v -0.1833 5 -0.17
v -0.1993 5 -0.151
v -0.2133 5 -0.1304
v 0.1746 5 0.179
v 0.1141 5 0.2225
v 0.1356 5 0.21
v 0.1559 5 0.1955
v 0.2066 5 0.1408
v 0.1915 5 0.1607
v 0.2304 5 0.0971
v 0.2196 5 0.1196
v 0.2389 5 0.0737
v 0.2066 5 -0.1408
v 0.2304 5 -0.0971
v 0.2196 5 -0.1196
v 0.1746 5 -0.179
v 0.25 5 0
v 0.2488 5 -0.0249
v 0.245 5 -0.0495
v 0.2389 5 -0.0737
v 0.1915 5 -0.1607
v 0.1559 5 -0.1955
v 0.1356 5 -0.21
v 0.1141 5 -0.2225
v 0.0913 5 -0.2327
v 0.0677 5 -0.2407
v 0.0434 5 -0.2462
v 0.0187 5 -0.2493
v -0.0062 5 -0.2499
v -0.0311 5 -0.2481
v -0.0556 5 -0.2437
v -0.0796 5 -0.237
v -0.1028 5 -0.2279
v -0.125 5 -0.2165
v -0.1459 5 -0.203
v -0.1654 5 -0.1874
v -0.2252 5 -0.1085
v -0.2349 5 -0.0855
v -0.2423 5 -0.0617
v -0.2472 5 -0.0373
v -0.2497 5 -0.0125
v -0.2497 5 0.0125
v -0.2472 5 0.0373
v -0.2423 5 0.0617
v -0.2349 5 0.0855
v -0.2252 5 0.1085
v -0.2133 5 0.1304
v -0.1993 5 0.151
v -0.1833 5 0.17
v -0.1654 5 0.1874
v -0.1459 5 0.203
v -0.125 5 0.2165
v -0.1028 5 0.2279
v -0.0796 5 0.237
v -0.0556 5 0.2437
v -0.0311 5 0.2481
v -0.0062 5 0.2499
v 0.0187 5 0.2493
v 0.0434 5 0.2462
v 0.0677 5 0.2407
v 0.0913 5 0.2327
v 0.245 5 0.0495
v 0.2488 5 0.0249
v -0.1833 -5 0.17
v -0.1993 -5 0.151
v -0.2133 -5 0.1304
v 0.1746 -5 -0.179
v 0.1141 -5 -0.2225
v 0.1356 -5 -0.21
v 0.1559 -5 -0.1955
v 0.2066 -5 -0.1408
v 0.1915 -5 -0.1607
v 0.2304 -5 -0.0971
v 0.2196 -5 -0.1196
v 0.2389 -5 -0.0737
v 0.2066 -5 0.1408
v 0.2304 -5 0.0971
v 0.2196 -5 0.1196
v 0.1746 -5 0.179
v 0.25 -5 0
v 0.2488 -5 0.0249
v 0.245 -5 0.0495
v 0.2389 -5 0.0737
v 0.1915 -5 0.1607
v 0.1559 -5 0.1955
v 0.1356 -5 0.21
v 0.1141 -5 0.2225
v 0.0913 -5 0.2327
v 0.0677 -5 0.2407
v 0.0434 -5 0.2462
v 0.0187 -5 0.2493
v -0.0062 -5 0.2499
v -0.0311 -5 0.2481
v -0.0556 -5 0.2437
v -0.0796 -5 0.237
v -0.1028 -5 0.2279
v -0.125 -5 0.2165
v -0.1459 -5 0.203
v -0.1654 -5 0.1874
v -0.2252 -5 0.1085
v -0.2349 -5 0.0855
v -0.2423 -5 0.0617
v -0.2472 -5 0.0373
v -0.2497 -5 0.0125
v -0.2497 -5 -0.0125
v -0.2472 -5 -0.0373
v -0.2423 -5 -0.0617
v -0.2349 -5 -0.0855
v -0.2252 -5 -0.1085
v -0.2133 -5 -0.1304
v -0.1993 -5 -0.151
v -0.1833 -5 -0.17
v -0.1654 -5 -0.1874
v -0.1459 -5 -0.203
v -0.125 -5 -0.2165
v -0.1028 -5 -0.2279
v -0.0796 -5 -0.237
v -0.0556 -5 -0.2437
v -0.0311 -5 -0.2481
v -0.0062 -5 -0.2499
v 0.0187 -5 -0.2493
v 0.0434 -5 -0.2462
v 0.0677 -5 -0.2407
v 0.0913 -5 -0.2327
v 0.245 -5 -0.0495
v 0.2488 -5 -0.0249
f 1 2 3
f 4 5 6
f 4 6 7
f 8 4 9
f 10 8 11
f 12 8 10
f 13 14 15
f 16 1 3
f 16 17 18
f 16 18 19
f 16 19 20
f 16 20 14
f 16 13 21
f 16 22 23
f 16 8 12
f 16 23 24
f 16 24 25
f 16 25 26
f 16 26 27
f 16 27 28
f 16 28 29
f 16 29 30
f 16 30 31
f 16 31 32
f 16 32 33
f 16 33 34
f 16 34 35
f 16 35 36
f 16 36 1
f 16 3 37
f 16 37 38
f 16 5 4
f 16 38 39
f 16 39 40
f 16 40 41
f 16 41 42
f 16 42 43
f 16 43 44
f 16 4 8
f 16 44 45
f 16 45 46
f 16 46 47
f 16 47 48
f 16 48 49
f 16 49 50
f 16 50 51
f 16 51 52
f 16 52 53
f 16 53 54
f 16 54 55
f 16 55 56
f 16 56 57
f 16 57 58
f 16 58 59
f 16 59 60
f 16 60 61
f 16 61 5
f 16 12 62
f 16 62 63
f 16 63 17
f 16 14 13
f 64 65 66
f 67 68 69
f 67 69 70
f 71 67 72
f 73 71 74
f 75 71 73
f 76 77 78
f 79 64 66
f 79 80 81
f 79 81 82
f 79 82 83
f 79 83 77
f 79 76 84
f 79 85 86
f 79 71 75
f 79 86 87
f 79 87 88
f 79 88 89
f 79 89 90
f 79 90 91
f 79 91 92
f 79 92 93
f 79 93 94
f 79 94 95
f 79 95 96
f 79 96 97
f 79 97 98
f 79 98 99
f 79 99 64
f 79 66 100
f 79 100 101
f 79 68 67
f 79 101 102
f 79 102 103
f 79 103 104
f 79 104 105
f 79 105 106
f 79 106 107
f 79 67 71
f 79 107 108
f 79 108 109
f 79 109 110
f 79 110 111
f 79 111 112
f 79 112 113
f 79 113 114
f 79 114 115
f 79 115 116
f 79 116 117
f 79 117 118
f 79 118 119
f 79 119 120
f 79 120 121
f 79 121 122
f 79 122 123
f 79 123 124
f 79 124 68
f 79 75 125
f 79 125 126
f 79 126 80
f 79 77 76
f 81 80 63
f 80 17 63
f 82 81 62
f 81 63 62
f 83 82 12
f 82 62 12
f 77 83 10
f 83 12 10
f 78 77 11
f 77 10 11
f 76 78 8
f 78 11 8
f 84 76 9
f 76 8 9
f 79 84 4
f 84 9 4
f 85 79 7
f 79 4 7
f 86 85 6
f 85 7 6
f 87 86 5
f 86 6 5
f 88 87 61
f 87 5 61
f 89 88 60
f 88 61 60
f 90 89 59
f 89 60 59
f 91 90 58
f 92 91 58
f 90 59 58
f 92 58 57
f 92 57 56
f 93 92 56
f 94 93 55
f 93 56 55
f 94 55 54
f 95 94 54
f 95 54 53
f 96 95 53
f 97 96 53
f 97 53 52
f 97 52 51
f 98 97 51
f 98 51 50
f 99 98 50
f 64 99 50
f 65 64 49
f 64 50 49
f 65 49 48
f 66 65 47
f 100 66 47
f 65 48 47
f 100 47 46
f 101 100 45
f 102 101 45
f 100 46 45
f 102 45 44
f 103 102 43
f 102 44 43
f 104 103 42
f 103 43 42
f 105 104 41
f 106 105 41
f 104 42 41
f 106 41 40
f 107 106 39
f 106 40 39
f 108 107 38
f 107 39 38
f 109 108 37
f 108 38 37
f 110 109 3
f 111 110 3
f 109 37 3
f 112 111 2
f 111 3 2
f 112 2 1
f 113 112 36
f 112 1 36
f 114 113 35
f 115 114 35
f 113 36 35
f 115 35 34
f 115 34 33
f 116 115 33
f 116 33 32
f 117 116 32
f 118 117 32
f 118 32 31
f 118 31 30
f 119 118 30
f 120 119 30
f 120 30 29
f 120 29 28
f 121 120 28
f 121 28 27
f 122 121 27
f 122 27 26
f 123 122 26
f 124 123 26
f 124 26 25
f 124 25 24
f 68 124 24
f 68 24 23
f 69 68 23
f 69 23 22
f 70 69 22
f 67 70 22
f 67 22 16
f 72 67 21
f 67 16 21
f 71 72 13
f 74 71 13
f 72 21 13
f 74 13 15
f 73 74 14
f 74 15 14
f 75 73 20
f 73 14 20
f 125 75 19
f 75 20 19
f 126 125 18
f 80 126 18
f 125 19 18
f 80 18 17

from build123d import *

# Parameters (mm, degrees)
SKETCH1_R           = 0.25
BOSS_EXTRUDE1_DEPTH = 0.75
SKETCH2_R           = 0.25
BOSS_EXTRUDE2_DEPTH = 4.25
SKETCH3_R           = 0.25
BOSS_EXTRUDE3_DEPTH = 4.25


with BuildPart() as part:
    # Sketch1 → Boss-Extrude1 (new body, symmetric)
    with BuildSketch(Plane(origin=(0, 0, 0), x_dir=(1, 0, 0), z_dir=(0, 1, 0))):
        Circle(SKETCH1_R)
    extrude(amount=BOSS_EXTRUDE1_DEPTH, both=True)

    # Sketch2 → Boss-Extrude2 (add)
    with BuildSketch(Plane(origin=(0, 0.75, 0), x_dir=(1, 0, 0), z_dir=(0, 1, 0))):
        Circle(SKETCH2_R)
    extrude(amount=BOSS_EXTRUDE2_DEPTH)

    # Sketch3 → Boss-Extrude3 (add)
    with BuildSketch(Plane.XZ.offset(0.75)):
        Circle(SKETCH3_R)
    extrude(amount=BOSS_EXTRUDE3_DEPTH)


solid = part.part
